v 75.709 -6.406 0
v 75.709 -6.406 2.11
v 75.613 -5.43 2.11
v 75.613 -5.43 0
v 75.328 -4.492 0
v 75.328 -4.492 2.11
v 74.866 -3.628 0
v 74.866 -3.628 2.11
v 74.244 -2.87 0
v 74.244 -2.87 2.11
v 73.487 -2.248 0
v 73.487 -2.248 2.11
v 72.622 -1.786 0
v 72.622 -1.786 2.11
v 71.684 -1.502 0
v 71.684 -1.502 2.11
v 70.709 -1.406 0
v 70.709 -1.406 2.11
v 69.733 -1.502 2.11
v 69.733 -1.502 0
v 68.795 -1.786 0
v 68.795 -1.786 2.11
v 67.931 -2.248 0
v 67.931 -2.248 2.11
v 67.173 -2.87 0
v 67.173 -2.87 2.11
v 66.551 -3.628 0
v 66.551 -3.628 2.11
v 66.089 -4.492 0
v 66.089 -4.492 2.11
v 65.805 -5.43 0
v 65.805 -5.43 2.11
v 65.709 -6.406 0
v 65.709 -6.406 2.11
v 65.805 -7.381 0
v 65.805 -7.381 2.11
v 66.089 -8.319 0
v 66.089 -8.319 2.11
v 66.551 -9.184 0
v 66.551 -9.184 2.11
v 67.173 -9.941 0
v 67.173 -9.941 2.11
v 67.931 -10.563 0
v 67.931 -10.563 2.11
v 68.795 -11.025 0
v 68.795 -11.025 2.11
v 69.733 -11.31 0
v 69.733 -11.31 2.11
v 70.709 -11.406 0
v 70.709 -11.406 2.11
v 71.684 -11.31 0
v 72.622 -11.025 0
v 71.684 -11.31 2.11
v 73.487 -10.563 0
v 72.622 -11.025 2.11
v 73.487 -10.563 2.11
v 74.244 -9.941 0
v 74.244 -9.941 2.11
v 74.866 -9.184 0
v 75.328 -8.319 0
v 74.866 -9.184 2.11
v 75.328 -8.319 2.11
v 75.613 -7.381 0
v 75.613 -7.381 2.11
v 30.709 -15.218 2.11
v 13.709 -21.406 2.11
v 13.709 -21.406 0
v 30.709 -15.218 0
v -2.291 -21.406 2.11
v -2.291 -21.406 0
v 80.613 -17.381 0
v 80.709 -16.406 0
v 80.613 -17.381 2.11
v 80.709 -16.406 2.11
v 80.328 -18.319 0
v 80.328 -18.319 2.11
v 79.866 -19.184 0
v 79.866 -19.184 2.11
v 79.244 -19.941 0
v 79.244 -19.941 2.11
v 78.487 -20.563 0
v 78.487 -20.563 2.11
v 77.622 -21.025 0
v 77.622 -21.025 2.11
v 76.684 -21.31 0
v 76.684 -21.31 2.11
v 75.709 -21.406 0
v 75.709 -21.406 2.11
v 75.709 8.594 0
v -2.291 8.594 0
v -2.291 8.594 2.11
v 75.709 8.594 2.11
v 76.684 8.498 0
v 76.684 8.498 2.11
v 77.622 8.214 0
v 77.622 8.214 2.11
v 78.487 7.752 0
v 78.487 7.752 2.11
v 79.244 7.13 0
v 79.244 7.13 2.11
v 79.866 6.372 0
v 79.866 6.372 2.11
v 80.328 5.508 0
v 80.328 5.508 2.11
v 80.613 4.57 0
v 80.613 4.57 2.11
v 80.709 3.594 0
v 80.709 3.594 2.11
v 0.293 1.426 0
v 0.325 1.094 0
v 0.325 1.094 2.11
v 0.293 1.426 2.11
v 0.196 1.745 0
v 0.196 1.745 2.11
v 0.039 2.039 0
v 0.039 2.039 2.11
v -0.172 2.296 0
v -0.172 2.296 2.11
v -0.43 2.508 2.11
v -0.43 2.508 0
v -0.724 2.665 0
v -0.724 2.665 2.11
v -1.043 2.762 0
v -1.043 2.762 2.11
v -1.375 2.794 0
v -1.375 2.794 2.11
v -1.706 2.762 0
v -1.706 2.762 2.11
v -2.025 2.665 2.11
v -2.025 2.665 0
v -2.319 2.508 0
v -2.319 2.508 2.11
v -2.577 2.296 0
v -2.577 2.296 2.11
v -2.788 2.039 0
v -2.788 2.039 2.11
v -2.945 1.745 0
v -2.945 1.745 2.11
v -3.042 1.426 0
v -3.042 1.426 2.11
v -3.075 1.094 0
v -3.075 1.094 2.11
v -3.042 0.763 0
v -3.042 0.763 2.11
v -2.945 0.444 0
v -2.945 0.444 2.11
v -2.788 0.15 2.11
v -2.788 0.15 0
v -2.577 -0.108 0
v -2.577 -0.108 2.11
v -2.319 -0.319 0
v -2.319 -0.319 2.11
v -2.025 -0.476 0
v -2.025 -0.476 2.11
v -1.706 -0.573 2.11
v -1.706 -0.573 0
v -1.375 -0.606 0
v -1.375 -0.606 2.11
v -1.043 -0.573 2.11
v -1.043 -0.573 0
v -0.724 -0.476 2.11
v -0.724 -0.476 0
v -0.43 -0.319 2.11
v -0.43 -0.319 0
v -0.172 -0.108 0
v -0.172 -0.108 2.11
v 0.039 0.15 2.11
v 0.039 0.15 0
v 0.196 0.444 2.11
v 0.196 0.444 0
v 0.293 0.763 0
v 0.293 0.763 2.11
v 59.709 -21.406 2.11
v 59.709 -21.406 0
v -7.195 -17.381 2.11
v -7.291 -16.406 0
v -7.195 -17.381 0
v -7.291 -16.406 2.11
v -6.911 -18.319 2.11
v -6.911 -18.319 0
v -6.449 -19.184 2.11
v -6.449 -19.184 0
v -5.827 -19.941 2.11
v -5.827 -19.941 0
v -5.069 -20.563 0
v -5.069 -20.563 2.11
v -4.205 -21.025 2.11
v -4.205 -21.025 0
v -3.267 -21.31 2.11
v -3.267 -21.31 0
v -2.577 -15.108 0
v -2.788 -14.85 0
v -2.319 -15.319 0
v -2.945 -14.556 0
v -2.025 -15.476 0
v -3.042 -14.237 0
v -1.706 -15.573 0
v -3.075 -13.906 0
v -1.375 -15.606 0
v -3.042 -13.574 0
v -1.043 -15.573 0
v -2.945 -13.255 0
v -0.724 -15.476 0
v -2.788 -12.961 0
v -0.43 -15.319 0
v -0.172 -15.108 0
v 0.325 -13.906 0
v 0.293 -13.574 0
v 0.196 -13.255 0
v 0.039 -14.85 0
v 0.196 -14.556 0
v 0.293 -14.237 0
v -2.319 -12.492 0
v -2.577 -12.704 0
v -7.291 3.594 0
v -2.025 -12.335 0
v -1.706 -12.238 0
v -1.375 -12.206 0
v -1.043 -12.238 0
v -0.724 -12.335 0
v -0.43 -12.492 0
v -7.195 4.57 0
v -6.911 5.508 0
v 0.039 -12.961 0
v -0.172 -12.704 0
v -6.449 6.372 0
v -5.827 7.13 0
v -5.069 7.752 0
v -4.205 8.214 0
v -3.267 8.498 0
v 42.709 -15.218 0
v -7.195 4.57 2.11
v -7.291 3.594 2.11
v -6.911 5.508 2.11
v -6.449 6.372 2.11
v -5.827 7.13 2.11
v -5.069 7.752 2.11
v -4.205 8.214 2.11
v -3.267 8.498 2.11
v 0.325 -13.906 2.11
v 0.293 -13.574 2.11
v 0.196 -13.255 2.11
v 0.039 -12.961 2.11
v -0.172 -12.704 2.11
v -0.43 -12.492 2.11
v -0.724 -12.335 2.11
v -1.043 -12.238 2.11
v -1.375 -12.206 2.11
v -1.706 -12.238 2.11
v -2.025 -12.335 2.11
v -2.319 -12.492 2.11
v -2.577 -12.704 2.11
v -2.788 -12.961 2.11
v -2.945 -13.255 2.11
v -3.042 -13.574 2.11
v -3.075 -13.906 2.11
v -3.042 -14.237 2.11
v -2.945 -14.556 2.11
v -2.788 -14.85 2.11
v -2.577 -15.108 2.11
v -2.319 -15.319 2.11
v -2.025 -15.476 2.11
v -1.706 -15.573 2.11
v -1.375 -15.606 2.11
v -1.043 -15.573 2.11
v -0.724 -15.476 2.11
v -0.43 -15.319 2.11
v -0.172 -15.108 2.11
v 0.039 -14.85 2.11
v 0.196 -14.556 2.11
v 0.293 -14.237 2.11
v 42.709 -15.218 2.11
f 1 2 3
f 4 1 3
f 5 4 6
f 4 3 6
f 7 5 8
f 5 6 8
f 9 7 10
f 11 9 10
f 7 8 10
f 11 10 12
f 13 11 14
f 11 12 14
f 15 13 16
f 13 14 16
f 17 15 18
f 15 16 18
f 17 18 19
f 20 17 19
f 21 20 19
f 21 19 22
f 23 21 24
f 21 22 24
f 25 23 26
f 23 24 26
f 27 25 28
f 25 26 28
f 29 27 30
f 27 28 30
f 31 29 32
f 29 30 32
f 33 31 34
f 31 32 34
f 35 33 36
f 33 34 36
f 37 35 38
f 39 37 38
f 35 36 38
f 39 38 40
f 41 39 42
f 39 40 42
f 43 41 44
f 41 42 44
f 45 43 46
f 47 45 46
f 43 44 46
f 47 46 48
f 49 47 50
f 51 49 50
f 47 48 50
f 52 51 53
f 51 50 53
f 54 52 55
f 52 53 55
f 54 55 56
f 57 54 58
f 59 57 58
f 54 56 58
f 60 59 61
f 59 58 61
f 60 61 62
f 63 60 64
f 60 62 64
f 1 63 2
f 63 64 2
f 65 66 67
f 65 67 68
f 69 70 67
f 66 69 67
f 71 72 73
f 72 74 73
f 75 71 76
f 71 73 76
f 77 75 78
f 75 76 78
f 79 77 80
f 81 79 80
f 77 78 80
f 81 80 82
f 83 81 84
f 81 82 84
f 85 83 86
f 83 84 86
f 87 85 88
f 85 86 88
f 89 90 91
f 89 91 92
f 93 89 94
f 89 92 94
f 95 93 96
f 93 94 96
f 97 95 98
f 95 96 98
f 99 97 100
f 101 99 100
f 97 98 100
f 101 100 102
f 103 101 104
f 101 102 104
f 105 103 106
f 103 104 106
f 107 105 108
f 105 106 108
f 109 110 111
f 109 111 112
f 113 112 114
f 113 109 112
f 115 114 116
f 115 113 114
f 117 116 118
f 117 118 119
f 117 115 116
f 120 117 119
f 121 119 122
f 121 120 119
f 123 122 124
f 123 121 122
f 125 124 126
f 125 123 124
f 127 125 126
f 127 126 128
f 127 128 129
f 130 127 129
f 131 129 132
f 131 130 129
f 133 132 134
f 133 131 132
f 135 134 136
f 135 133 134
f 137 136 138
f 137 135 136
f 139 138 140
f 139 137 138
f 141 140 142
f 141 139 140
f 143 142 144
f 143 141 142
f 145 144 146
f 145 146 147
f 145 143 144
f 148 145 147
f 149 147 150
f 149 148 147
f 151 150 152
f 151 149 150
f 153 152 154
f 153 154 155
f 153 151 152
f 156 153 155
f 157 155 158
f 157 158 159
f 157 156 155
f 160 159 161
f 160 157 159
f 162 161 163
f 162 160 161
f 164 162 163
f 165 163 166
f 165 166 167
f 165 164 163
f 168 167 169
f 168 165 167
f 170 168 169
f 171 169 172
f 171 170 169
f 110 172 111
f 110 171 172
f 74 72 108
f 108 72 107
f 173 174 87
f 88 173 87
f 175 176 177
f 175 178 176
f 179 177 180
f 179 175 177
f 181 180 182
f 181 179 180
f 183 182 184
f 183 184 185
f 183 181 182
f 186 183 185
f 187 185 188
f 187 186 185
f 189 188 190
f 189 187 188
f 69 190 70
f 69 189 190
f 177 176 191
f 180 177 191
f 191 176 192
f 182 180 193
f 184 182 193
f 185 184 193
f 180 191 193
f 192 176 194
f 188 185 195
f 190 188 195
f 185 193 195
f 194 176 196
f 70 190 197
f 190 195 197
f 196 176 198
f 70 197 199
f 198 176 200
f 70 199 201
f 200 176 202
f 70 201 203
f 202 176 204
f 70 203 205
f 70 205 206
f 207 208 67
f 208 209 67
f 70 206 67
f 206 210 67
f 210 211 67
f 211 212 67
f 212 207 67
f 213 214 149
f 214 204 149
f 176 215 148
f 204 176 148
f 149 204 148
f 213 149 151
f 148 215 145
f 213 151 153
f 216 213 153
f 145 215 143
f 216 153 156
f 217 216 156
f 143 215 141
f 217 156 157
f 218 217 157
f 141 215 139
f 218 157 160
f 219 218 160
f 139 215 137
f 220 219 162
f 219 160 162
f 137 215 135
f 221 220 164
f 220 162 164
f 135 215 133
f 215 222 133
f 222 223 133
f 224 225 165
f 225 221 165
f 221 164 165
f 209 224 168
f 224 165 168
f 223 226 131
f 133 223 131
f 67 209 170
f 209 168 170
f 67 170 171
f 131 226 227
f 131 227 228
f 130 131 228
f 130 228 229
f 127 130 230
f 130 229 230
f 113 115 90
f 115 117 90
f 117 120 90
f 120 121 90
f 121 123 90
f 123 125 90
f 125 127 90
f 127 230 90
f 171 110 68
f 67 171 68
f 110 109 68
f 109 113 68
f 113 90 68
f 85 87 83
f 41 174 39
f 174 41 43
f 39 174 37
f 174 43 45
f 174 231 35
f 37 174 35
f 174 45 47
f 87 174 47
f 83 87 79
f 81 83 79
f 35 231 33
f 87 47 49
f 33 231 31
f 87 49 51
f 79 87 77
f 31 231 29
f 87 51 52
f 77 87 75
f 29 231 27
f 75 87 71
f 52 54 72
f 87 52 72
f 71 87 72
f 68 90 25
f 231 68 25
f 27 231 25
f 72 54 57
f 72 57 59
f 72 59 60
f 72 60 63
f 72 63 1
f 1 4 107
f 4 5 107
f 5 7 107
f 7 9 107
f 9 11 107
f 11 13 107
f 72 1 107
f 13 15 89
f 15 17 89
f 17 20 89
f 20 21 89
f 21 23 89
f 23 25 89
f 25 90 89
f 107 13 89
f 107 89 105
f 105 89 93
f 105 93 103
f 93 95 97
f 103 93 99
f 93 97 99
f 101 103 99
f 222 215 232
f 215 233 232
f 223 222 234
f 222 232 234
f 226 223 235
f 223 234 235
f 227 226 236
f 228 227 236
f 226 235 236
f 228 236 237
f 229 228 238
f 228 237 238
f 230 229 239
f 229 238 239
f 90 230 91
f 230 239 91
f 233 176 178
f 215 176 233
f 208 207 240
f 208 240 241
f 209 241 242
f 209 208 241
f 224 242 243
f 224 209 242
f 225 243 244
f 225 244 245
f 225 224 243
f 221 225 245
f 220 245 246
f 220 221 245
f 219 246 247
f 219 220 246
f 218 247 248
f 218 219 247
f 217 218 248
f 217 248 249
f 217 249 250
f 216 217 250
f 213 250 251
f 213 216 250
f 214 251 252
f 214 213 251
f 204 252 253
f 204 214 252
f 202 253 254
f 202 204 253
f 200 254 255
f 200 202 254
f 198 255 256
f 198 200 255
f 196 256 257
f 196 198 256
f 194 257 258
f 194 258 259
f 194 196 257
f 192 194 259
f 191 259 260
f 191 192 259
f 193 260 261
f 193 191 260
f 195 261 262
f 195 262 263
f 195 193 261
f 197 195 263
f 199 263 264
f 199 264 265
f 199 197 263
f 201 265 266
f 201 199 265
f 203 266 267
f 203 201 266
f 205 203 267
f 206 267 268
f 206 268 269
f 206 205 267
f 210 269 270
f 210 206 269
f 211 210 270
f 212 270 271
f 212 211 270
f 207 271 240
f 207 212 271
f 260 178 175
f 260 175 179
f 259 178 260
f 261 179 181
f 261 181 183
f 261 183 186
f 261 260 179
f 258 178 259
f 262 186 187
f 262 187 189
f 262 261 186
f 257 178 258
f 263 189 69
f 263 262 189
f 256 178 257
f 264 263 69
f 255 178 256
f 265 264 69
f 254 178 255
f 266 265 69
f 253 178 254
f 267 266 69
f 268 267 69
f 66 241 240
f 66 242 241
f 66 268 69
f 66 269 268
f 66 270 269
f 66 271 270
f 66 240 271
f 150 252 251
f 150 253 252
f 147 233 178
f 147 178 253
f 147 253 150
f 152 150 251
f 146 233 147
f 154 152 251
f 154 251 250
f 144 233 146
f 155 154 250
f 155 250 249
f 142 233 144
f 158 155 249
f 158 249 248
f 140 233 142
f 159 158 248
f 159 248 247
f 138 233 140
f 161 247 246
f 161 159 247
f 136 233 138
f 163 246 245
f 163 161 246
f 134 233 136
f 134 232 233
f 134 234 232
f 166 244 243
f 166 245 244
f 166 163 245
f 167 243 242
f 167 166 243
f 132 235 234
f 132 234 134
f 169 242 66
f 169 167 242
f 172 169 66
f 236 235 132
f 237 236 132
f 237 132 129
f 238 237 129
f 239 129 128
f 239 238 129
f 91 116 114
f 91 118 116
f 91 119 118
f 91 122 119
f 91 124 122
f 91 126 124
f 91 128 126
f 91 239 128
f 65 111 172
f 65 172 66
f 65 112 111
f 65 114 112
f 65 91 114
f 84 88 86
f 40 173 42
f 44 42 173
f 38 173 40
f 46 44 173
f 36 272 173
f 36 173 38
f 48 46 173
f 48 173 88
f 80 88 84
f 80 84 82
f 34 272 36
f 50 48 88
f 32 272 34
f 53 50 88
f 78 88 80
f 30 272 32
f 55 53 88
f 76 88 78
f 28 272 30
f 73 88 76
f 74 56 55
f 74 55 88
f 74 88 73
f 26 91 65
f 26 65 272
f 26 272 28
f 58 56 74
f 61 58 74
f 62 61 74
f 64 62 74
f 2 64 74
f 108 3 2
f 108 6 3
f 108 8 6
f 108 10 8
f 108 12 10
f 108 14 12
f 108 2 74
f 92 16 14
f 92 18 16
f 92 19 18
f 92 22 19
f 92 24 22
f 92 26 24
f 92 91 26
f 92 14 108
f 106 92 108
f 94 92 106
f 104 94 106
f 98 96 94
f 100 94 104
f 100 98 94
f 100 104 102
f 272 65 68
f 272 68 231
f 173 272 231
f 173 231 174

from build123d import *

# Parameters (mm, degrees)
CROQUIS1_W              = 88
CROQUIS1_H              = 30
CROQUIS1_R              = 1.7
SALIENTE_EXTRUIR1_DEPTH = 2.11
CROQUIS6_R              = 5
CORTAR_EXTRUIR2_DEPTH   = 2.11
CORTAR_EXTRUIR3_DEPTH   = 2.11
REDONDEO1_R             = 5


with BuildPart() as part:
    # Croquis1 → Saliente-Extruir1 (new body)
    with BuildSketch(Plane.XY):
        with Locations((36.708826457, -6.405767977)):
            Rectangle(CROQUIS1_W, CROQUIS1_H)
        with Locations((-1.37457934, 1.094232023)):
            Circle(CROQUIS1_R, mode=Mode.SUBTRACT)
        with Locations((-1.37457934, -13.905767977)):
            Circle(CROQUIS1_R, mode=Mode.SUBTRACT)
    extrude(amount=SALIENTE_EXTRUIR1_DEPTH)

    # Croquis6 → Cortar-Extruir2 (cut)
    with BuildSketch(Plane.XY.offset(2.11)):
        with Locations((70.708826457, -6.405767977)):
            Circle(CROQUIS6_R)
    extrude(amount=-CORTAR_EXTRUIR2_DEPTH, mode=Mode.SUBTRACT)

    # Croquis7 → Cortar-Extruir3 (cut)
    with BuildSketch(Plane.XY.offset(2.11)):
        Polygon((13.708826457, -21.405767977), (30.708826457, -15.218273994), (42.708826457, -15.218273994), (59.708826457, -21.405767977), align=None)
    extrude(amount=-CORTAR_EXTRUIR3_DEPTH, mode=Mode.SUBTRACT)

    # Redondeo1
    redondeo1_edges = [part.edges().sort_by_distance(p)[0] for p in [
        (80.708826457, 8.594232023, 1.055),
        (80.708826457, -21.405767977, 1.055),
        (-7.291173543, -21.405767977, 1.055),
        (-7.291173543, 8.594232023, 1.055),
    ]]
    fillet(redondeo1_edges, radius=REDONDEO1_R)


solid = part.part
